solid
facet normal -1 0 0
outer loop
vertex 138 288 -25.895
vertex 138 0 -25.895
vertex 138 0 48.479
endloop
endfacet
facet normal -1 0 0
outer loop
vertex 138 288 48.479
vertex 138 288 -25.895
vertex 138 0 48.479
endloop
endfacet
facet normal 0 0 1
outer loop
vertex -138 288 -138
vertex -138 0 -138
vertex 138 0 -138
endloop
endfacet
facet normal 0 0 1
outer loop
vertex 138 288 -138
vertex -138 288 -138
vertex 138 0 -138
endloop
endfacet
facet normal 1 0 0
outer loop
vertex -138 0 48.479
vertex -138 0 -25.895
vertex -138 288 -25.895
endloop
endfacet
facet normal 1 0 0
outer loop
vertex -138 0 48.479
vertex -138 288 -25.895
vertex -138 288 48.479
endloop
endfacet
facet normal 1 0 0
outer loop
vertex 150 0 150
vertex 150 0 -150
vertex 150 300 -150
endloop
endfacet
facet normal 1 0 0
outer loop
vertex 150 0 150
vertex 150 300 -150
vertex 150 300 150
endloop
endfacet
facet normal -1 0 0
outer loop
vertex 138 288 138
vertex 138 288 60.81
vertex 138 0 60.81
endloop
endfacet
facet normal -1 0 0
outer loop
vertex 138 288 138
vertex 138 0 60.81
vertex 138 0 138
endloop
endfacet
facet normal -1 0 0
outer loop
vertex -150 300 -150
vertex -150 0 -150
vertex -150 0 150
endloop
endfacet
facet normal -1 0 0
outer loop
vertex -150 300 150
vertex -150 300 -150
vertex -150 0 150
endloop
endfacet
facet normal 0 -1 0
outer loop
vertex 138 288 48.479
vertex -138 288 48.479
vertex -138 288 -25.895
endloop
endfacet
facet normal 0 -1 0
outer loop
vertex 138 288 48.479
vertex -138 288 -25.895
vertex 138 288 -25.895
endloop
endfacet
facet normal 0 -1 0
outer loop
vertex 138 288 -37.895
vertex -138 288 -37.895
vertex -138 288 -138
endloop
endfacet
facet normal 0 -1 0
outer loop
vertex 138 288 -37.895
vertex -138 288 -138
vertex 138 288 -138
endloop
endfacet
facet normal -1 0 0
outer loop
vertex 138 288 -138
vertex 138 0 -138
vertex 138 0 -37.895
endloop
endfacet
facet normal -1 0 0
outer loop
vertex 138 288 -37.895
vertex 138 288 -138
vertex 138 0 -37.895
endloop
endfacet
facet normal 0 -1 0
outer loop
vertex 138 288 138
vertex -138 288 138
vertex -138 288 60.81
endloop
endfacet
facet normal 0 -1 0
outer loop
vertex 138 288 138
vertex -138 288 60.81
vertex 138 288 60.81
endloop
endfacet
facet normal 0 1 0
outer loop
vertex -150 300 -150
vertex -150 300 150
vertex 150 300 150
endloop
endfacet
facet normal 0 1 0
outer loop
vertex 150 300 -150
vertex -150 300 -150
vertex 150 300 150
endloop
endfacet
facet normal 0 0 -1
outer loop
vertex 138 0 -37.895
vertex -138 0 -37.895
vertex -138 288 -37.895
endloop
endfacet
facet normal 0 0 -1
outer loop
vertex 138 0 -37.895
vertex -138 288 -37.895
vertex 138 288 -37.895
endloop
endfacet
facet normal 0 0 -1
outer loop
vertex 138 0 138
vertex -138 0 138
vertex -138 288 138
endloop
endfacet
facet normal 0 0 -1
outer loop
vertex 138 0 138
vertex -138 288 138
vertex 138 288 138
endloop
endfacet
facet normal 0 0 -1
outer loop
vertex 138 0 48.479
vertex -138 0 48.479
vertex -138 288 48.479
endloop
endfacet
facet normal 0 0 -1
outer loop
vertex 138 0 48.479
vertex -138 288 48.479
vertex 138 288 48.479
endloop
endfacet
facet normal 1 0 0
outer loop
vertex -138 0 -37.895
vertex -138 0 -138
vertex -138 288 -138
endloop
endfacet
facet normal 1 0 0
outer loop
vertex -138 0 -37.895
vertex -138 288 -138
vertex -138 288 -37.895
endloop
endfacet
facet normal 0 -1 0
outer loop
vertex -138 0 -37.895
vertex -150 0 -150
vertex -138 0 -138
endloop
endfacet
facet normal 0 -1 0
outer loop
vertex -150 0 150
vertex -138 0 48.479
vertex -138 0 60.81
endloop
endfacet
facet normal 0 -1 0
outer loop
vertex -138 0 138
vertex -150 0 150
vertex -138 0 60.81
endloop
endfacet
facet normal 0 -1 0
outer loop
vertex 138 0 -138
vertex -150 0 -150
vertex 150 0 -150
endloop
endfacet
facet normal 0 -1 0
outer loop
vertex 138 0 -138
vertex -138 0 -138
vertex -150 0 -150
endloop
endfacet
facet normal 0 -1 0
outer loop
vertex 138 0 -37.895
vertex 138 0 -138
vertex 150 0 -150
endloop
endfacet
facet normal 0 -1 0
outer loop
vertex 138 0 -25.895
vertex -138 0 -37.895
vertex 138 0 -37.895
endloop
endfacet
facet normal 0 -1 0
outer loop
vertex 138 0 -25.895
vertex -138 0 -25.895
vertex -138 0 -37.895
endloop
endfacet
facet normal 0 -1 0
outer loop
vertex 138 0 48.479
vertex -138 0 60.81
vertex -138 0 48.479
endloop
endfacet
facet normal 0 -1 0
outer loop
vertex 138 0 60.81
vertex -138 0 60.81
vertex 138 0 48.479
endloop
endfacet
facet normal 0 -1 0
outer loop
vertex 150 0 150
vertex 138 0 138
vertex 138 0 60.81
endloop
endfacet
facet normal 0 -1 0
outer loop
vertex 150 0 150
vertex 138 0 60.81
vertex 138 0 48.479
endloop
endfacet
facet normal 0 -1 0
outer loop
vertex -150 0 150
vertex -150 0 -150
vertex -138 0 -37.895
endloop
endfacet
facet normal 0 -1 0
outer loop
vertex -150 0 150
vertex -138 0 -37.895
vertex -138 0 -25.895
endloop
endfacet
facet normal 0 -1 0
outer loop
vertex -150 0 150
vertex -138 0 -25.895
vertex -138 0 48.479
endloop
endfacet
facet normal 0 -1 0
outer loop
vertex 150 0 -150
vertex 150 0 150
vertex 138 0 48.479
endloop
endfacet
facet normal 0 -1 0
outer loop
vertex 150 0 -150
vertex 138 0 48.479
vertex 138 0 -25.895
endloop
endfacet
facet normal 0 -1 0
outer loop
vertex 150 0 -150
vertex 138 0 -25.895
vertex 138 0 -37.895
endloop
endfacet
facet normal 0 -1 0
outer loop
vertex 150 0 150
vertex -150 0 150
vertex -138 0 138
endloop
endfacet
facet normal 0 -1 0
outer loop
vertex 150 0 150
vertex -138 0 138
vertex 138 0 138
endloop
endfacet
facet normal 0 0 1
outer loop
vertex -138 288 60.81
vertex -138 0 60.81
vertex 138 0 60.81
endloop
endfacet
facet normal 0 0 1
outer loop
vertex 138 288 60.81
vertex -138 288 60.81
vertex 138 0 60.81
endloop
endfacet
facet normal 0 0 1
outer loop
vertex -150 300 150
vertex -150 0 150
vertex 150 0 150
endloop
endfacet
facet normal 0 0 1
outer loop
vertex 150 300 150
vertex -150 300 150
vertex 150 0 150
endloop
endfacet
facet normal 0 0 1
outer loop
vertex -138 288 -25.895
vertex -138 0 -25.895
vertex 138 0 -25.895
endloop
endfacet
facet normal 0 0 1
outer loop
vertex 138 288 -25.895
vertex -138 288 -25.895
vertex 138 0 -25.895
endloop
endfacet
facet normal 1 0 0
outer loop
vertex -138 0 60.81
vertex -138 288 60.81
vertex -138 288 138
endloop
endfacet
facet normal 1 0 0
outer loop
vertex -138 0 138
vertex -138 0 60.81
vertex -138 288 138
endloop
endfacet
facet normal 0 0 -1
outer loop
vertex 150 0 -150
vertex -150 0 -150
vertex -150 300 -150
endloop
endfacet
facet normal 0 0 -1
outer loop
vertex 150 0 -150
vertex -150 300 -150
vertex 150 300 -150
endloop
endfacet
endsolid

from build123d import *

# Parameters (mm, degrees)
F0_W     = 300
F0_H     = 300
F1_DEPTH = 300
F2_T     = -12
F3_W     = 276
F3_H     = 12.3312585362
F3_H_2   = 12
F4_DEPTH = 295


with BuildPart() as f1:
    # F0 (on Front) → F1 (new body)
    with BuildSketch(Plane.XZ):
        Rectangle(F0_W, F0_H)
    extrude(amount=-F1_DEPTH)

    # F2
    f2_openings = [f1.faces().sort_by_distance(p)[0] for p in [
        (0, 0, 0),
    ]]
    offset(amount=F2_T, openings=f2_openings)

    # F3 (on face) → F4 (join)
    with BuildSketch(Plane.XZ):
        with Locations((0, 54.6443801671)):
            Rectangle(F3_W, F3_H)
        with Locations((0, -31.8947338536)):
            Rectangle(F3_W, F3_H_2)
    extrude(amount=-F4_DEPTH)


solid = f1.part
